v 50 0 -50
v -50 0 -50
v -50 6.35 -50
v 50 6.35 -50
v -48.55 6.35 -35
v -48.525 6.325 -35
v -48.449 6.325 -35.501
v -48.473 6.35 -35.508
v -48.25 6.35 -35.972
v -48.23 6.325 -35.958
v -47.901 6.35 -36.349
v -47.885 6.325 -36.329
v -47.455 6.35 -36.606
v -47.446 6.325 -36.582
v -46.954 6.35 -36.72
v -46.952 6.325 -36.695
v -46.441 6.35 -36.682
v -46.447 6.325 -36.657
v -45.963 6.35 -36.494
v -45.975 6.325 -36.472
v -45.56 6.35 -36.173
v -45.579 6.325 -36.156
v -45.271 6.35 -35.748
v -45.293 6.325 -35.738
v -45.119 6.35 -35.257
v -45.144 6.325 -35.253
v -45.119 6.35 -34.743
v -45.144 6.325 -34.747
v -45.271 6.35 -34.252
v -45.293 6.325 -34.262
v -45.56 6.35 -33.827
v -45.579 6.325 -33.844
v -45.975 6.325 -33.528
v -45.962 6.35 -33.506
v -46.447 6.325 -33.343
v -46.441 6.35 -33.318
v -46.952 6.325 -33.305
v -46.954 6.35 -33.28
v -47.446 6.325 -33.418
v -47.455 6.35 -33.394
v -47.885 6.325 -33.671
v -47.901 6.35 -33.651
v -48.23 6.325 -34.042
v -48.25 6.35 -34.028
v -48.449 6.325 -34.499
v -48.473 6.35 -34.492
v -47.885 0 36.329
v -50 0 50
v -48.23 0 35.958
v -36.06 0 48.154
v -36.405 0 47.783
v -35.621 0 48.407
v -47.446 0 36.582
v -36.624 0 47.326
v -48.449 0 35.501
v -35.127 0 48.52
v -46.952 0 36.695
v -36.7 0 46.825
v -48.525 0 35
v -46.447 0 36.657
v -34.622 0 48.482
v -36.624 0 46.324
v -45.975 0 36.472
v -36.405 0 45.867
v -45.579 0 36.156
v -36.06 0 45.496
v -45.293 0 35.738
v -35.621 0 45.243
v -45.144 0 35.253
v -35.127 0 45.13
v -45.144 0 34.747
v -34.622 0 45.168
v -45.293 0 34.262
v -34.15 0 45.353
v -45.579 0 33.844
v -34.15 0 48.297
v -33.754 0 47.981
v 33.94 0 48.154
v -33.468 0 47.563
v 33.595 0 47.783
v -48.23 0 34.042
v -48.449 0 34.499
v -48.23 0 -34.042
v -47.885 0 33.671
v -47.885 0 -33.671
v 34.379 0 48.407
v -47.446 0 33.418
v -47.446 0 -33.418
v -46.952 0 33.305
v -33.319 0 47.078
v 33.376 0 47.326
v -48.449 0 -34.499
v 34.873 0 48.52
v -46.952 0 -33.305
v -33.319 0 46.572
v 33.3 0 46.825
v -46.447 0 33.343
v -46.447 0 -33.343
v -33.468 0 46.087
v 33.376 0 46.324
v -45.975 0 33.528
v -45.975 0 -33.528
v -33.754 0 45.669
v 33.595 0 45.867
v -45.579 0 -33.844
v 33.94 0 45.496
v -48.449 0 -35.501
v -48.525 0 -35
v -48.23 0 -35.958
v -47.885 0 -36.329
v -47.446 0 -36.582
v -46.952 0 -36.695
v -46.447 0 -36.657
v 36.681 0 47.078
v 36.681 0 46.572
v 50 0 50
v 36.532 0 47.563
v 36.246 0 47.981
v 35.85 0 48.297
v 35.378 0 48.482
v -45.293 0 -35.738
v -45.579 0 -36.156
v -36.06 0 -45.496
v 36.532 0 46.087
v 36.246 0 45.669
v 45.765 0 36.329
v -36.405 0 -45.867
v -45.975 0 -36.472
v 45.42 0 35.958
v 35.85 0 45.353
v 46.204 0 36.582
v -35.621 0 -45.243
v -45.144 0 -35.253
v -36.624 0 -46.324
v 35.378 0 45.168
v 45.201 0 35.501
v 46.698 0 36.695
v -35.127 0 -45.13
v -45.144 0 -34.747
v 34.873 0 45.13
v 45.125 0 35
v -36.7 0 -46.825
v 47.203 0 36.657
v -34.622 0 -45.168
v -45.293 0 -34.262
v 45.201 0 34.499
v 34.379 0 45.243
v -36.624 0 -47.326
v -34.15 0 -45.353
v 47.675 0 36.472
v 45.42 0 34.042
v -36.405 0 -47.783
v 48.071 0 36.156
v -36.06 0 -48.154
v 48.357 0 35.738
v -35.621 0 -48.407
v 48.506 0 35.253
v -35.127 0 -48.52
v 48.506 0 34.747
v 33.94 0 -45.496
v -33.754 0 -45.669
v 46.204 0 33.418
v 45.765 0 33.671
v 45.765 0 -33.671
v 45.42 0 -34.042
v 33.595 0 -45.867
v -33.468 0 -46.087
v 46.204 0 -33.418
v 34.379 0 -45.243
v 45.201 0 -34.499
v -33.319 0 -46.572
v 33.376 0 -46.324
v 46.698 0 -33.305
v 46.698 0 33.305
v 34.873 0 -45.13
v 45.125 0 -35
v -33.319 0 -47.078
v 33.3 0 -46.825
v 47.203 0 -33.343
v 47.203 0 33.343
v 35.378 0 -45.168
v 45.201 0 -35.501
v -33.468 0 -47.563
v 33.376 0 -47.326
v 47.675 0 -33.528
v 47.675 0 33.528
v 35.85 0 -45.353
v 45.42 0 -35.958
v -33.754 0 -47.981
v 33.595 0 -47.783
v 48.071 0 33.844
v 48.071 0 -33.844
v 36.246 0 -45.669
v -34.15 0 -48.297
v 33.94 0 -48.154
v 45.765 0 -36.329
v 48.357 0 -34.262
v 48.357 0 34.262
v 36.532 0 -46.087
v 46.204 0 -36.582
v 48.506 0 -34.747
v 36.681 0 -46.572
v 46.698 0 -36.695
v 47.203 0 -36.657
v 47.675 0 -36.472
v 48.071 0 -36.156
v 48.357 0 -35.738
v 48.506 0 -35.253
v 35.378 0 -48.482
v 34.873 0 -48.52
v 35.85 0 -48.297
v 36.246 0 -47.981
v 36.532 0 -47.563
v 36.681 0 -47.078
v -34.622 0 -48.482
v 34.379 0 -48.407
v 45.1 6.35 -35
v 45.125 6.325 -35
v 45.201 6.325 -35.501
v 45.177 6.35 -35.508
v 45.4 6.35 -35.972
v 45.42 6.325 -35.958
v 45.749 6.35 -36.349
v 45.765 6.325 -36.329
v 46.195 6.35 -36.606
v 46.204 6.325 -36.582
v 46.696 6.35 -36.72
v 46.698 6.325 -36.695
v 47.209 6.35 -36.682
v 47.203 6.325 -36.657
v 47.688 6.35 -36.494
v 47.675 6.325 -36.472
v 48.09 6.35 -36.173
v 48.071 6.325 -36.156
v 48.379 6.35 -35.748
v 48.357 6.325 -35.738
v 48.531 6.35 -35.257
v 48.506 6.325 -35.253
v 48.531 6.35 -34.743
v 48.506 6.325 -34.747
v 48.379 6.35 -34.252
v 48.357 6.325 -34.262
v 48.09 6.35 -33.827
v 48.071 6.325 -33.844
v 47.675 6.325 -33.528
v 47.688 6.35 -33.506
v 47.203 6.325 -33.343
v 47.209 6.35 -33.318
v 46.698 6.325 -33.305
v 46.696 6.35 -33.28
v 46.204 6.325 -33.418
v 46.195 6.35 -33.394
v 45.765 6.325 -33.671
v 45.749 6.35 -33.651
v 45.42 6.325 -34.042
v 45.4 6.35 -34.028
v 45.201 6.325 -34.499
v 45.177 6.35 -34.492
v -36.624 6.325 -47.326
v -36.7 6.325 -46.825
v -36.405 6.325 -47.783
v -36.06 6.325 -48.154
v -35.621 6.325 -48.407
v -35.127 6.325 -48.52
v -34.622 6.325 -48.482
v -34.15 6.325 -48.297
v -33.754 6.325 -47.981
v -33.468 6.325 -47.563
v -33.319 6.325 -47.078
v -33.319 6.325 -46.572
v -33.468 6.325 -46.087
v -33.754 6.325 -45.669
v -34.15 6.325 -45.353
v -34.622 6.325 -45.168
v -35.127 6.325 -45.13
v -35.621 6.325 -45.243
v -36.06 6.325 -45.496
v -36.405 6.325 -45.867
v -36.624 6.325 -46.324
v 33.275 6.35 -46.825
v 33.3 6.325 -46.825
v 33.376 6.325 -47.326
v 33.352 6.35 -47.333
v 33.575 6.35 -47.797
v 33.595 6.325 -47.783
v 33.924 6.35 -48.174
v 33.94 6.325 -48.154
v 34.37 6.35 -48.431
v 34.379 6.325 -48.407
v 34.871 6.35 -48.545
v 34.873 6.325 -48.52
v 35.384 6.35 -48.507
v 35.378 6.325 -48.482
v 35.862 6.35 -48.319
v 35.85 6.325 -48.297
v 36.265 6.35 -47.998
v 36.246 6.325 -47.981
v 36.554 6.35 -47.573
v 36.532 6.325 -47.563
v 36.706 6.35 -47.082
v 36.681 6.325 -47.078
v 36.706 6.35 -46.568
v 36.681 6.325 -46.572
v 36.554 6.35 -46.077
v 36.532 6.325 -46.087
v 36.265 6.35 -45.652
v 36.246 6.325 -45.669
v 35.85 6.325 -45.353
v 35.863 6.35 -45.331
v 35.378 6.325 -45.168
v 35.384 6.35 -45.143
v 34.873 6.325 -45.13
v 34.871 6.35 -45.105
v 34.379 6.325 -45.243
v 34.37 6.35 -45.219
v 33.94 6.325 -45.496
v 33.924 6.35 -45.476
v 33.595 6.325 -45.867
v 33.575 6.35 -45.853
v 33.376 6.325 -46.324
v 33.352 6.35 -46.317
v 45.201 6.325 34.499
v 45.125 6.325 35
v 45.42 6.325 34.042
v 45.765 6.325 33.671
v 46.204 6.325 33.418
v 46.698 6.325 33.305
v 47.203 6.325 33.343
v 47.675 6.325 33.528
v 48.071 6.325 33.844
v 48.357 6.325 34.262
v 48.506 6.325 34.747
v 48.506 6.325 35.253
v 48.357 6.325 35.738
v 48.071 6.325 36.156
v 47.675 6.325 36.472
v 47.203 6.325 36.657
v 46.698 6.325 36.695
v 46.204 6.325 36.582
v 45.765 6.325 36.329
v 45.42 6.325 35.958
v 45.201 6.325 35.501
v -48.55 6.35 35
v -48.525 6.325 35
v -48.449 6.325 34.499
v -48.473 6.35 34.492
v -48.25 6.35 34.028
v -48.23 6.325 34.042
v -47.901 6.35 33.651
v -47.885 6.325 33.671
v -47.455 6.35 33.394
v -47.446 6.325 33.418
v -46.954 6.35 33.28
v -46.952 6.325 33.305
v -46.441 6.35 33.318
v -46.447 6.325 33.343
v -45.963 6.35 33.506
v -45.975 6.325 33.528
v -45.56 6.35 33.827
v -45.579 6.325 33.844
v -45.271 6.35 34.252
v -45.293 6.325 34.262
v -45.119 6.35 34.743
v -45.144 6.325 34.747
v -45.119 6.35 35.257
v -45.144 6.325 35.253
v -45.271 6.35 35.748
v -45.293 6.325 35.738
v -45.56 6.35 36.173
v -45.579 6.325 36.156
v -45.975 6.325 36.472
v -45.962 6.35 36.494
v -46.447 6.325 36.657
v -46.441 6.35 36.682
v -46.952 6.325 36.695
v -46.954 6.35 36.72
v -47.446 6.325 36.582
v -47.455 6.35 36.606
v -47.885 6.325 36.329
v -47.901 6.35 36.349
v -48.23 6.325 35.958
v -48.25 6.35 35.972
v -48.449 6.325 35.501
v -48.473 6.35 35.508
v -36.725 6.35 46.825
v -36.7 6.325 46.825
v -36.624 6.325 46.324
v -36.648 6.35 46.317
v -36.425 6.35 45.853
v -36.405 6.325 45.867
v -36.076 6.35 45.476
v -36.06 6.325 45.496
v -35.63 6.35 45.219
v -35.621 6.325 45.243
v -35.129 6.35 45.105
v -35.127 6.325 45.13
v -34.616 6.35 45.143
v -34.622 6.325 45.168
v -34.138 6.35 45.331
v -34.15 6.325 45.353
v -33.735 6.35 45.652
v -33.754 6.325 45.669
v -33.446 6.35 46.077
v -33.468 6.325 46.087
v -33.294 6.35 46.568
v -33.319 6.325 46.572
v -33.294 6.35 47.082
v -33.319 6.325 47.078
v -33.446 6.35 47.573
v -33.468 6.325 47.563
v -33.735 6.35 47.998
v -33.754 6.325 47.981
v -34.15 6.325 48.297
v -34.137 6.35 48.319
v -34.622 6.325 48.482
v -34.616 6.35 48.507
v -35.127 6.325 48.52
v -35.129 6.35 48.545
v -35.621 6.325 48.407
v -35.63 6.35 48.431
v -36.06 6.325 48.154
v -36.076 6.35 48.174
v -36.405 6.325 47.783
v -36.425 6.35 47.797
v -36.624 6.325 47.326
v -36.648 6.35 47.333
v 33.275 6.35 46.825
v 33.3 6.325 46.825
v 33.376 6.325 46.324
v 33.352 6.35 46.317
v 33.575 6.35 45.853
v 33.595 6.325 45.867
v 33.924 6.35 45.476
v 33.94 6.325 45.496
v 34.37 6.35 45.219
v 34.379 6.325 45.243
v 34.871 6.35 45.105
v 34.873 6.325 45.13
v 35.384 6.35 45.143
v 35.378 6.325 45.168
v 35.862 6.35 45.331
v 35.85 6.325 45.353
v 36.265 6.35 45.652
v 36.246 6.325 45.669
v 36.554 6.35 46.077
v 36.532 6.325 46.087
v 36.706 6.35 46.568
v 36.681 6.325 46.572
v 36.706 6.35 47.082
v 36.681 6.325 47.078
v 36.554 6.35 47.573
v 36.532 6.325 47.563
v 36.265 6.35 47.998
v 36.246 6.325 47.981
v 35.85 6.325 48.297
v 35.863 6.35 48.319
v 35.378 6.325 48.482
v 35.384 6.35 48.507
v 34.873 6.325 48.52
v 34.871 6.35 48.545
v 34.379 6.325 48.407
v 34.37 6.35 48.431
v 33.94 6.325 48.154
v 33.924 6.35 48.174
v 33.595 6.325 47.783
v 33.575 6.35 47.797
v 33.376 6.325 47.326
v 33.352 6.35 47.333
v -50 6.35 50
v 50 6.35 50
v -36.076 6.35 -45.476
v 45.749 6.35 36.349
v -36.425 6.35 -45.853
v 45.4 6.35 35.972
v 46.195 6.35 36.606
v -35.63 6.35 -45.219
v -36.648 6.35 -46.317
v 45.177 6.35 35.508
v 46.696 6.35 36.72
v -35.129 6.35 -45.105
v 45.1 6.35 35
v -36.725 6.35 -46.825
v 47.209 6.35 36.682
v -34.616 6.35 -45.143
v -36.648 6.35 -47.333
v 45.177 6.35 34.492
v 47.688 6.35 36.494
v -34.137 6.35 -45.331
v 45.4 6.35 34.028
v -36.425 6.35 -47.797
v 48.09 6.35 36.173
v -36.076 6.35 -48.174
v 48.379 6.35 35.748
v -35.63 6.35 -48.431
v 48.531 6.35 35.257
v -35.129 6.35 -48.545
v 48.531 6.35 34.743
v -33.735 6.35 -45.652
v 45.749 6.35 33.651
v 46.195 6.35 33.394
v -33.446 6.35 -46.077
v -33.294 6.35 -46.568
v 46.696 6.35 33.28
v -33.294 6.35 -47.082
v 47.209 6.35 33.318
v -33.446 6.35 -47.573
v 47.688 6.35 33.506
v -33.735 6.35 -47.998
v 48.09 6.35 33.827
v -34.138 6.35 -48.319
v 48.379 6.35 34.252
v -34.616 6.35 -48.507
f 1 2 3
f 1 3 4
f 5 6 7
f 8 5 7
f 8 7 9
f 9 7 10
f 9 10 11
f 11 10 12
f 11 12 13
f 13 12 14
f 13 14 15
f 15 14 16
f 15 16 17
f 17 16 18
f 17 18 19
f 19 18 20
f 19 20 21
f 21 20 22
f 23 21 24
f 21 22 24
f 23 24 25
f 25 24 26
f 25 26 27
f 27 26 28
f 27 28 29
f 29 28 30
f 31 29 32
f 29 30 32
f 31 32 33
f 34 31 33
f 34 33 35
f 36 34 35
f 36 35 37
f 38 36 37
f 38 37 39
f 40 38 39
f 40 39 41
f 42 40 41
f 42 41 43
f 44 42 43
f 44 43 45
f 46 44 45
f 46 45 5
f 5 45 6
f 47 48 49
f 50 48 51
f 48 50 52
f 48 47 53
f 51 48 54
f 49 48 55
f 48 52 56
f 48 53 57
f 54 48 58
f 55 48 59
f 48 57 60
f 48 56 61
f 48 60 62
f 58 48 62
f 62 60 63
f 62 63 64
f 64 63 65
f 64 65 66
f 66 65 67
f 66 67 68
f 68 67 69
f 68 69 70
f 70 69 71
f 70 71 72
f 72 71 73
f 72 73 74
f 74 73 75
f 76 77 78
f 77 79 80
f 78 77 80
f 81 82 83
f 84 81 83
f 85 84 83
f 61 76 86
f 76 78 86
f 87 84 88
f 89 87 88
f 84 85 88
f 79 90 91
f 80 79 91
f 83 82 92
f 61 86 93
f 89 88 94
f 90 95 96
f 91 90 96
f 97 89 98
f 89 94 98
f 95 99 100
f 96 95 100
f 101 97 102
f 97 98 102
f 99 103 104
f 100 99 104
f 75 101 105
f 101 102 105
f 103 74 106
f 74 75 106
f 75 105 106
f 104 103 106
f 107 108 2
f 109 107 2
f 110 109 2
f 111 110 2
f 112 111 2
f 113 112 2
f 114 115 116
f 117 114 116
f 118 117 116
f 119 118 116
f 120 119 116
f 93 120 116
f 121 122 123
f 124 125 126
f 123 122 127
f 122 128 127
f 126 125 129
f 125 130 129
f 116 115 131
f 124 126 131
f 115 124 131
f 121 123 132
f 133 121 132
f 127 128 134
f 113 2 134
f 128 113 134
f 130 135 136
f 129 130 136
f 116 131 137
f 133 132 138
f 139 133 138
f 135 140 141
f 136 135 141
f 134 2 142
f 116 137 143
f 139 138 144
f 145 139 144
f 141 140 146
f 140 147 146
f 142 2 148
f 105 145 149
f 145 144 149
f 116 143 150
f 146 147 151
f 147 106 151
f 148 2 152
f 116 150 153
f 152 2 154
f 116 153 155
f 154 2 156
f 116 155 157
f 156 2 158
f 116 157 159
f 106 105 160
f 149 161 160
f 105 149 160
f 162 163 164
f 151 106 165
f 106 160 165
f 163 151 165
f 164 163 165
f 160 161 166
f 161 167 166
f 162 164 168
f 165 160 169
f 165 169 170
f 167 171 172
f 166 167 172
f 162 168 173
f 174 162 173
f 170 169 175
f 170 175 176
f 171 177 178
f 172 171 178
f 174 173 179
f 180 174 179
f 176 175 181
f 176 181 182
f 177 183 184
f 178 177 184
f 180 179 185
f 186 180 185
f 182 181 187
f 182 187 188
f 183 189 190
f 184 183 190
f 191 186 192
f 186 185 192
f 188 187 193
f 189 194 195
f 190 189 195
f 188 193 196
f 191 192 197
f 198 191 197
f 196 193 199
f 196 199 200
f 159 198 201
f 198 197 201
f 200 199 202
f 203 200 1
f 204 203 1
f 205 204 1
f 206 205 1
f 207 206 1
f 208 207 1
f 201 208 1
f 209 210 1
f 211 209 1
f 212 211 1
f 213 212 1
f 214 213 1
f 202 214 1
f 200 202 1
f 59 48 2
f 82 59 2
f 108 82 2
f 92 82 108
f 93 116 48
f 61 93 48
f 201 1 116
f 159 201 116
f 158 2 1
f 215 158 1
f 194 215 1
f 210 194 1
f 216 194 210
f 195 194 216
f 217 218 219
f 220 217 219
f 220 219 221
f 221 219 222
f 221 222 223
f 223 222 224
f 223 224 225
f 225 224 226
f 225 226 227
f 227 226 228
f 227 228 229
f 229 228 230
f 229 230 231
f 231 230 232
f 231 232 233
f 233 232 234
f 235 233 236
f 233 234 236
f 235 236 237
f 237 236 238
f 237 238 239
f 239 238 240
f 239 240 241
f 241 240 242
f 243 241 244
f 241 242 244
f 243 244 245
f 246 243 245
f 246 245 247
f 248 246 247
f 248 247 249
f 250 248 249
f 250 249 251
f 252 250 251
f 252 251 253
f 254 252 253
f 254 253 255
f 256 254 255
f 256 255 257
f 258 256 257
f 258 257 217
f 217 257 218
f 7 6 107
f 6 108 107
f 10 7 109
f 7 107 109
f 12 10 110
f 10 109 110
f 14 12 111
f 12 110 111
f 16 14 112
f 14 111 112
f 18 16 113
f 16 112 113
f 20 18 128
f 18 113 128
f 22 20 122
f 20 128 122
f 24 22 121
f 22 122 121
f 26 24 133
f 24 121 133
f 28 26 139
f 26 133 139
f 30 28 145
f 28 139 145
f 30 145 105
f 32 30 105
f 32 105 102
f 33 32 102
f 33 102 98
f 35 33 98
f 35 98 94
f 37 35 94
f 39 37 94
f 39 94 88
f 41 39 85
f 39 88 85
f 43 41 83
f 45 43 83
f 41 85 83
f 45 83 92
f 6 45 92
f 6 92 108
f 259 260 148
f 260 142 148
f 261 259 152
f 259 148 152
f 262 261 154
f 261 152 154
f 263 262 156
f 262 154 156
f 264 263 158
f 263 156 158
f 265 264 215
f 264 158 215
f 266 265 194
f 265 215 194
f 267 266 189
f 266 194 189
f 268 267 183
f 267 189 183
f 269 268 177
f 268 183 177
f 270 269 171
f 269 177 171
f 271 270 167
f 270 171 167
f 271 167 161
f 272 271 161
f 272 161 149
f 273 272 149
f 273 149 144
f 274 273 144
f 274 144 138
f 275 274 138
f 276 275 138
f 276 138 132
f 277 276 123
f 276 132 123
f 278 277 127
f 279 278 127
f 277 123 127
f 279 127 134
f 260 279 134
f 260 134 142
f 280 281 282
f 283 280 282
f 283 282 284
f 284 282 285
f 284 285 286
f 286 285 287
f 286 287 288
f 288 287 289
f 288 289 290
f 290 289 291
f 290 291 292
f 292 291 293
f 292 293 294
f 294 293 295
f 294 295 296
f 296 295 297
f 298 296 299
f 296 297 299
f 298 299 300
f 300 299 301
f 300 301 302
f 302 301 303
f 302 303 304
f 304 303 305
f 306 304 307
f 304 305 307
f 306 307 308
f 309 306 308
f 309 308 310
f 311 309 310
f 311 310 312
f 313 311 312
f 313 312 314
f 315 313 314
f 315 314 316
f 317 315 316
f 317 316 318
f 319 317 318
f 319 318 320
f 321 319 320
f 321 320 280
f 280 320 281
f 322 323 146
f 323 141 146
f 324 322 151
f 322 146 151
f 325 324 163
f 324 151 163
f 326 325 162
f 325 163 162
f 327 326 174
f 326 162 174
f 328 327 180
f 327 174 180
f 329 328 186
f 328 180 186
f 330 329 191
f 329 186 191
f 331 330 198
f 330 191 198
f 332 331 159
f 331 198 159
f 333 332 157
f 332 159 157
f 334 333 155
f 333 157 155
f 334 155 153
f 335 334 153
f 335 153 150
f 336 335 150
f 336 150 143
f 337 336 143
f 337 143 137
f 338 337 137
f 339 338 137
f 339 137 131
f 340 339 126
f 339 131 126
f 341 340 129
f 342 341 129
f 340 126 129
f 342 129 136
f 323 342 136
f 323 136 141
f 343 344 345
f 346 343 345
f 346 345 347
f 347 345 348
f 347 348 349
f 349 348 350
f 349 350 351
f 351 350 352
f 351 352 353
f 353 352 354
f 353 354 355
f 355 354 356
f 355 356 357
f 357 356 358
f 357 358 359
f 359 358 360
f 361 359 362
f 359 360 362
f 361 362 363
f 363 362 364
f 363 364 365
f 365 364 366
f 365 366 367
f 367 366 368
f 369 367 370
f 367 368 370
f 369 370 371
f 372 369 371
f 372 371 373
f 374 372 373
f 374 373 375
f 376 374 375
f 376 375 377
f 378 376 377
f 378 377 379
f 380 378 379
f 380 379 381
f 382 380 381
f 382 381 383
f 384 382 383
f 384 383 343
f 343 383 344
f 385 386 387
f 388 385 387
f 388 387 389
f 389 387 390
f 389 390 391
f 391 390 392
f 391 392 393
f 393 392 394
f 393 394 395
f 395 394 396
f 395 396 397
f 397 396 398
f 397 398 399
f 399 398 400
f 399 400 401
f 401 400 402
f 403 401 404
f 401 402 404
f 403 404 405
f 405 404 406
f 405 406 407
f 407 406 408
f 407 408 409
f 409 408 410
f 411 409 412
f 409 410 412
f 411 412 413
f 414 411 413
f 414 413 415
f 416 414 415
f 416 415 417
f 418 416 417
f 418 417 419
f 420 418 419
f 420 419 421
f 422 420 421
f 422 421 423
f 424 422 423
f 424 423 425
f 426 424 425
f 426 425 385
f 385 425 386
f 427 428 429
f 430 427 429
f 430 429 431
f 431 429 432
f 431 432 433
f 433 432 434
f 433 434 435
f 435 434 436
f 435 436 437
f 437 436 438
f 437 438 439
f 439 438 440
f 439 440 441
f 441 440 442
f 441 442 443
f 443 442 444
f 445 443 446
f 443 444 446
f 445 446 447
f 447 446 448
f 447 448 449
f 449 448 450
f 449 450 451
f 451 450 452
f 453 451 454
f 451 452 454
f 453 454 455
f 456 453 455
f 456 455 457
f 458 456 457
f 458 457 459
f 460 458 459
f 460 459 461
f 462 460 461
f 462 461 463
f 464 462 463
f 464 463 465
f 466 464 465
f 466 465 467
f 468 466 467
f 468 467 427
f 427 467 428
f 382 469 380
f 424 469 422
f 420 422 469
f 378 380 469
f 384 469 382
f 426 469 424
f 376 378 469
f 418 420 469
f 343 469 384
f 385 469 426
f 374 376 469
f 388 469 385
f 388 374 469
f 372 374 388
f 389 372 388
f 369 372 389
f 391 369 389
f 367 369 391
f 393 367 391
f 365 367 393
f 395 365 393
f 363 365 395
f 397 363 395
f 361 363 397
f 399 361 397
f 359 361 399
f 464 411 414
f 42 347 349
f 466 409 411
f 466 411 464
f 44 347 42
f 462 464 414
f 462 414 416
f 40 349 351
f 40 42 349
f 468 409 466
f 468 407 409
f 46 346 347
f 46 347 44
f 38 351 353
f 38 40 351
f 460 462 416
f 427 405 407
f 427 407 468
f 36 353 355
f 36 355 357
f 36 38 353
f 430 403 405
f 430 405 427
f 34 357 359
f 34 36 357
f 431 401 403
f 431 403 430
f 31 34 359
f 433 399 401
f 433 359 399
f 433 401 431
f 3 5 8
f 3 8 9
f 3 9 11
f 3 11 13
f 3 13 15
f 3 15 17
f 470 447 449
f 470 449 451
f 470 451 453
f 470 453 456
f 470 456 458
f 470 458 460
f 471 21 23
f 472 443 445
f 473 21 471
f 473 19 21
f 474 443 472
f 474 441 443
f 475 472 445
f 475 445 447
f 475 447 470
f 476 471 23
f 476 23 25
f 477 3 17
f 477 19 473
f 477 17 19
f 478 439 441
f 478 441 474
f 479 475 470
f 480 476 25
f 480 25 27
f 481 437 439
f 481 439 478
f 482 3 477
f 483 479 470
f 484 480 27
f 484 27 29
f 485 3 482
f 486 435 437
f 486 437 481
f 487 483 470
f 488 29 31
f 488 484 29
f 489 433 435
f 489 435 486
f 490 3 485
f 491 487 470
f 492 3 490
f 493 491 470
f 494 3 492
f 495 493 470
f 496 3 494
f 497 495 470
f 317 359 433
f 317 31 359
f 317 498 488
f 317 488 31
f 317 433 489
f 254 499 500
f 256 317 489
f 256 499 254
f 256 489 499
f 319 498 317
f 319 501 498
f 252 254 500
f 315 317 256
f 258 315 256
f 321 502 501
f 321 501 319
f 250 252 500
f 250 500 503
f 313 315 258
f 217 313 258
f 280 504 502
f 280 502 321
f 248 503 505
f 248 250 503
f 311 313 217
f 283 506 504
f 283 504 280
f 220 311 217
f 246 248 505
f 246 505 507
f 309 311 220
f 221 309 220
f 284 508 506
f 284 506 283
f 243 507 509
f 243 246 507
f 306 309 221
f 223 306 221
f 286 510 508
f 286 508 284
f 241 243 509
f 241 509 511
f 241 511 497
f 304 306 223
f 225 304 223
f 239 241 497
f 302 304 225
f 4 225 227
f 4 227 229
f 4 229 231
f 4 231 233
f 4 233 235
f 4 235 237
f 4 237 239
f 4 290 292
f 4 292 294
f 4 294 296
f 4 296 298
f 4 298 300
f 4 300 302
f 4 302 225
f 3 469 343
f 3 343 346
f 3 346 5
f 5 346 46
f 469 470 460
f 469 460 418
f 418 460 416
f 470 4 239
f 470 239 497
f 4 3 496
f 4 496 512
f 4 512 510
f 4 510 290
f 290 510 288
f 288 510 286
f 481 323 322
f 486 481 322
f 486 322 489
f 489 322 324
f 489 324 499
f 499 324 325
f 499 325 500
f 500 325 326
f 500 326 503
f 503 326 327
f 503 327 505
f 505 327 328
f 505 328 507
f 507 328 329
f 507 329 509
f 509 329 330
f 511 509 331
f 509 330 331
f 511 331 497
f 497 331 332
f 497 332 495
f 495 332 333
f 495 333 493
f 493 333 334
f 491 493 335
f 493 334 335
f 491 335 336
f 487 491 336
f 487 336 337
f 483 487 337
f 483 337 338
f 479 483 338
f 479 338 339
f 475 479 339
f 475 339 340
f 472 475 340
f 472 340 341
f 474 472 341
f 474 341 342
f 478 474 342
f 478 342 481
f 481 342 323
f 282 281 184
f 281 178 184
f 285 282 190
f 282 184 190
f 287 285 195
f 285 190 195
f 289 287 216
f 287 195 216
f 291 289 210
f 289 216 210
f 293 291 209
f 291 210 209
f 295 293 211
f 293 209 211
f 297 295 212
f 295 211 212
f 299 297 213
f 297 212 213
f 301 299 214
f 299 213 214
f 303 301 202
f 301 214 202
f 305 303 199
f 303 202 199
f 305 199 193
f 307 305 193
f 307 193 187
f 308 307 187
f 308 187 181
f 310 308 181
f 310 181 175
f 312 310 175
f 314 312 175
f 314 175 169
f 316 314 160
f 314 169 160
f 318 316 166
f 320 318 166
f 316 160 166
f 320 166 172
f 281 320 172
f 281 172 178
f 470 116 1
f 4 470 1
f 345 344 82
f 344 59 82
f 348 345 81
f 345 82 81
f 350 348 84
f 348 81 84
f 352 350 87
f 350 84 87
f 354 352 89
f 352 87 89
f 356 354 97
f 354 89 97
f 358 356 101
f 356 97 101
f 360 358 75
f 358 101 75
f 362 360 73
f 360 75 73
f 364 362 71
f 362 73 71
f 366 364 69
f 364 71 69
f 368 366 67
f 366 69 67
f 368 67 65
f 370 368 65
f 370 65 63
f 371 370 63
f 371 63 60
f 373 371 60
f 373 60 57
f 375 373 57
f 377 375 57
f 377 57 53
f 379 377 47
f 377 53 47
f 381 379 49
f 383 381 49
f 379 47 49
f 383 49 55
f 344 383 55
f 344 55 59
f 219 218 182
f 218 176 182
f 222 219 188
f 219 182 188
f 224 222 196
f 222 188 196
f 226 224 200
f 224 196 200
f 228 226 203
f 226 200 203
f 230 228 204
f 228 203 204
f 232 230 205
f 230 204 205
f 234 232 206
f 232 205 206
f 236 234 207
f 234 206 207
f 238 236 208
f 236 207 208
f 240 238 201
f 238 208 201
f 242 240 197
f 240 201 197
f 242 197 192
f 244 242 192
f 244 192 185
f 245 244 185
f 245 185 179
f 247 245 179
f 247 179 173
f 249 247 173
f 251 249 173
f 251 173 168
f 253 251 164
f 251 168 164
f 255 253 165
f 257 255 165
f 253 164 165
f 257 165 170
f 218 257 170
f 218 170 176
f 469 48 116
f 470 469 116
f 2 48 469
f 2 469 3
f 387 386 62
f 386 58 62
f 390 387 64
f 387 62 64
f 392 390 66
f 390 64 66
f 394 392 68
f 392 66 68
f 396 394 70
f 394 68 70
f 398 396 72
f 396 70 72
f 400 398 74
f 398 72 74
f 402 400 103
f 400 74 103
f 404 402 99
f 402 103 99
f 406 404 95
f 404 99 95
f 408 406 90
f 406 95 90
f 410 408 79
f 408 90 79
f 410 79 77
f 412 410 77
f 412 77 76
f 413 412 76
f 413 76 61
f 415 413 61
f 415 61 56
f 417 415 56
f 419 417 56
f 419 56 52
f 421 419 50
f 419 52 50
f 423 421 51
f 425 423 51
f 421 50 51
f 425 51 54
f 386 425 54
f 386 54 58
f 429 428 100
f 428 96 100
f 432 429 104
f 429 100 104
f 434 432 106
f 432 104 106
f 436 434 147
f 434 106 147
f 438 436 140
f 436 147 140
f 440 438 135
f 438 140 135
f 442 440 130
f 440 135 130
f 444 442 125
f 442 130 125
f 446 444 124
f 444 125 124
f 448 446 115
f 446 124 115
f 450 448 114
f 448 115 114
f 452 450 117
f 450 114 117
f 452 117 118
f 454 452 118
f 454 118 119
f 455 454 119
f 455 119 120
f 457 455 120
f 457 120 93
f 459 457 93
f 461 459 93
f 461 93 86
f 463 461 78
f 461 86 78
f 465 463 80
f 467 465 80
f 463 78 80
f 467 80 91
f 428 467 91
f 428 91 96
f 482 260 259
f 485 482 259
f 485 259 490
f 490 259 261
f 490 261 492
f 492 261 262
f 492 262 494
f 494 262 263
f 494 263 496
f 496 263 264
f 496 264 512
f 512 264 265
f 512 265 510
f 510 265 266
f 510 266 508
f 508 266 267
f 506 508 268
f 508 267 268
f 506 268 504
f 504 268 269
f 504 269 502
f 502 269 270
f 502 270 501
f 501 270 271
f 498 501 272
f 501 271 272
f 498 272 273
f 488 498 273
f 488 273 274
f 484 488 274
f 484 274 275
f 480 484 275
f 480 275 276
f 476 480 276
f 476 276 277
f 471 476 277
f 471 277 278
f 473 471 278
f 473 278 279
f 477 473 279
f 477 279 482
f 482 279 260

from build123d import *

# Parameters (mm, degrees)
SKETCH1_W                      = 100
SKETCH1_H                      = 100
BOSS_EXTRUDE3_DEPTH            = 6.35
M3_CLEARANCE_HOLE1_D           = 3.4
M3_CLEARANCE_HOLE1_CSINK_D     = 3.45
M3_CLEARANCE_HOLE1_CSINK_ANGLE = 90


with BuildPart() as part:
    # Sketch1 → Boss-Extrude3 (new body)
    with BuildSketch(Plane(origin=(0, 0, 0), x_dir=(1, 0, 0), z_dir=(0, 1, 0))):
        Rectangle(SKETCH1_W, SKETCH1_H)
    extrude(amount=BOSS_EXTRUDE3_DEPTH)

    # M3 Clearance Hole1 (through all)
    with Locations(Plane(origin=(0, 6.35, 0), x_dir=(1, 0, 0), z_dir=(0, 1, 0))):
        with Locations((-46.825, 35), (-35, 46.825), (35, 46.825), (46.825, 35), (46.825, -35), (35, -46.825), (-35, -46.825), (-46.825, -35)):
            CounterSinkHole(M3_CLEARANCE_HOLE1_D / 2, M3_CLEARANCE_HOLE1_CSINK_D / 2, counter_sink_angle=M3_CLEARANCE_HOLE1_CSINK_ANGLE)


solid = part.part
